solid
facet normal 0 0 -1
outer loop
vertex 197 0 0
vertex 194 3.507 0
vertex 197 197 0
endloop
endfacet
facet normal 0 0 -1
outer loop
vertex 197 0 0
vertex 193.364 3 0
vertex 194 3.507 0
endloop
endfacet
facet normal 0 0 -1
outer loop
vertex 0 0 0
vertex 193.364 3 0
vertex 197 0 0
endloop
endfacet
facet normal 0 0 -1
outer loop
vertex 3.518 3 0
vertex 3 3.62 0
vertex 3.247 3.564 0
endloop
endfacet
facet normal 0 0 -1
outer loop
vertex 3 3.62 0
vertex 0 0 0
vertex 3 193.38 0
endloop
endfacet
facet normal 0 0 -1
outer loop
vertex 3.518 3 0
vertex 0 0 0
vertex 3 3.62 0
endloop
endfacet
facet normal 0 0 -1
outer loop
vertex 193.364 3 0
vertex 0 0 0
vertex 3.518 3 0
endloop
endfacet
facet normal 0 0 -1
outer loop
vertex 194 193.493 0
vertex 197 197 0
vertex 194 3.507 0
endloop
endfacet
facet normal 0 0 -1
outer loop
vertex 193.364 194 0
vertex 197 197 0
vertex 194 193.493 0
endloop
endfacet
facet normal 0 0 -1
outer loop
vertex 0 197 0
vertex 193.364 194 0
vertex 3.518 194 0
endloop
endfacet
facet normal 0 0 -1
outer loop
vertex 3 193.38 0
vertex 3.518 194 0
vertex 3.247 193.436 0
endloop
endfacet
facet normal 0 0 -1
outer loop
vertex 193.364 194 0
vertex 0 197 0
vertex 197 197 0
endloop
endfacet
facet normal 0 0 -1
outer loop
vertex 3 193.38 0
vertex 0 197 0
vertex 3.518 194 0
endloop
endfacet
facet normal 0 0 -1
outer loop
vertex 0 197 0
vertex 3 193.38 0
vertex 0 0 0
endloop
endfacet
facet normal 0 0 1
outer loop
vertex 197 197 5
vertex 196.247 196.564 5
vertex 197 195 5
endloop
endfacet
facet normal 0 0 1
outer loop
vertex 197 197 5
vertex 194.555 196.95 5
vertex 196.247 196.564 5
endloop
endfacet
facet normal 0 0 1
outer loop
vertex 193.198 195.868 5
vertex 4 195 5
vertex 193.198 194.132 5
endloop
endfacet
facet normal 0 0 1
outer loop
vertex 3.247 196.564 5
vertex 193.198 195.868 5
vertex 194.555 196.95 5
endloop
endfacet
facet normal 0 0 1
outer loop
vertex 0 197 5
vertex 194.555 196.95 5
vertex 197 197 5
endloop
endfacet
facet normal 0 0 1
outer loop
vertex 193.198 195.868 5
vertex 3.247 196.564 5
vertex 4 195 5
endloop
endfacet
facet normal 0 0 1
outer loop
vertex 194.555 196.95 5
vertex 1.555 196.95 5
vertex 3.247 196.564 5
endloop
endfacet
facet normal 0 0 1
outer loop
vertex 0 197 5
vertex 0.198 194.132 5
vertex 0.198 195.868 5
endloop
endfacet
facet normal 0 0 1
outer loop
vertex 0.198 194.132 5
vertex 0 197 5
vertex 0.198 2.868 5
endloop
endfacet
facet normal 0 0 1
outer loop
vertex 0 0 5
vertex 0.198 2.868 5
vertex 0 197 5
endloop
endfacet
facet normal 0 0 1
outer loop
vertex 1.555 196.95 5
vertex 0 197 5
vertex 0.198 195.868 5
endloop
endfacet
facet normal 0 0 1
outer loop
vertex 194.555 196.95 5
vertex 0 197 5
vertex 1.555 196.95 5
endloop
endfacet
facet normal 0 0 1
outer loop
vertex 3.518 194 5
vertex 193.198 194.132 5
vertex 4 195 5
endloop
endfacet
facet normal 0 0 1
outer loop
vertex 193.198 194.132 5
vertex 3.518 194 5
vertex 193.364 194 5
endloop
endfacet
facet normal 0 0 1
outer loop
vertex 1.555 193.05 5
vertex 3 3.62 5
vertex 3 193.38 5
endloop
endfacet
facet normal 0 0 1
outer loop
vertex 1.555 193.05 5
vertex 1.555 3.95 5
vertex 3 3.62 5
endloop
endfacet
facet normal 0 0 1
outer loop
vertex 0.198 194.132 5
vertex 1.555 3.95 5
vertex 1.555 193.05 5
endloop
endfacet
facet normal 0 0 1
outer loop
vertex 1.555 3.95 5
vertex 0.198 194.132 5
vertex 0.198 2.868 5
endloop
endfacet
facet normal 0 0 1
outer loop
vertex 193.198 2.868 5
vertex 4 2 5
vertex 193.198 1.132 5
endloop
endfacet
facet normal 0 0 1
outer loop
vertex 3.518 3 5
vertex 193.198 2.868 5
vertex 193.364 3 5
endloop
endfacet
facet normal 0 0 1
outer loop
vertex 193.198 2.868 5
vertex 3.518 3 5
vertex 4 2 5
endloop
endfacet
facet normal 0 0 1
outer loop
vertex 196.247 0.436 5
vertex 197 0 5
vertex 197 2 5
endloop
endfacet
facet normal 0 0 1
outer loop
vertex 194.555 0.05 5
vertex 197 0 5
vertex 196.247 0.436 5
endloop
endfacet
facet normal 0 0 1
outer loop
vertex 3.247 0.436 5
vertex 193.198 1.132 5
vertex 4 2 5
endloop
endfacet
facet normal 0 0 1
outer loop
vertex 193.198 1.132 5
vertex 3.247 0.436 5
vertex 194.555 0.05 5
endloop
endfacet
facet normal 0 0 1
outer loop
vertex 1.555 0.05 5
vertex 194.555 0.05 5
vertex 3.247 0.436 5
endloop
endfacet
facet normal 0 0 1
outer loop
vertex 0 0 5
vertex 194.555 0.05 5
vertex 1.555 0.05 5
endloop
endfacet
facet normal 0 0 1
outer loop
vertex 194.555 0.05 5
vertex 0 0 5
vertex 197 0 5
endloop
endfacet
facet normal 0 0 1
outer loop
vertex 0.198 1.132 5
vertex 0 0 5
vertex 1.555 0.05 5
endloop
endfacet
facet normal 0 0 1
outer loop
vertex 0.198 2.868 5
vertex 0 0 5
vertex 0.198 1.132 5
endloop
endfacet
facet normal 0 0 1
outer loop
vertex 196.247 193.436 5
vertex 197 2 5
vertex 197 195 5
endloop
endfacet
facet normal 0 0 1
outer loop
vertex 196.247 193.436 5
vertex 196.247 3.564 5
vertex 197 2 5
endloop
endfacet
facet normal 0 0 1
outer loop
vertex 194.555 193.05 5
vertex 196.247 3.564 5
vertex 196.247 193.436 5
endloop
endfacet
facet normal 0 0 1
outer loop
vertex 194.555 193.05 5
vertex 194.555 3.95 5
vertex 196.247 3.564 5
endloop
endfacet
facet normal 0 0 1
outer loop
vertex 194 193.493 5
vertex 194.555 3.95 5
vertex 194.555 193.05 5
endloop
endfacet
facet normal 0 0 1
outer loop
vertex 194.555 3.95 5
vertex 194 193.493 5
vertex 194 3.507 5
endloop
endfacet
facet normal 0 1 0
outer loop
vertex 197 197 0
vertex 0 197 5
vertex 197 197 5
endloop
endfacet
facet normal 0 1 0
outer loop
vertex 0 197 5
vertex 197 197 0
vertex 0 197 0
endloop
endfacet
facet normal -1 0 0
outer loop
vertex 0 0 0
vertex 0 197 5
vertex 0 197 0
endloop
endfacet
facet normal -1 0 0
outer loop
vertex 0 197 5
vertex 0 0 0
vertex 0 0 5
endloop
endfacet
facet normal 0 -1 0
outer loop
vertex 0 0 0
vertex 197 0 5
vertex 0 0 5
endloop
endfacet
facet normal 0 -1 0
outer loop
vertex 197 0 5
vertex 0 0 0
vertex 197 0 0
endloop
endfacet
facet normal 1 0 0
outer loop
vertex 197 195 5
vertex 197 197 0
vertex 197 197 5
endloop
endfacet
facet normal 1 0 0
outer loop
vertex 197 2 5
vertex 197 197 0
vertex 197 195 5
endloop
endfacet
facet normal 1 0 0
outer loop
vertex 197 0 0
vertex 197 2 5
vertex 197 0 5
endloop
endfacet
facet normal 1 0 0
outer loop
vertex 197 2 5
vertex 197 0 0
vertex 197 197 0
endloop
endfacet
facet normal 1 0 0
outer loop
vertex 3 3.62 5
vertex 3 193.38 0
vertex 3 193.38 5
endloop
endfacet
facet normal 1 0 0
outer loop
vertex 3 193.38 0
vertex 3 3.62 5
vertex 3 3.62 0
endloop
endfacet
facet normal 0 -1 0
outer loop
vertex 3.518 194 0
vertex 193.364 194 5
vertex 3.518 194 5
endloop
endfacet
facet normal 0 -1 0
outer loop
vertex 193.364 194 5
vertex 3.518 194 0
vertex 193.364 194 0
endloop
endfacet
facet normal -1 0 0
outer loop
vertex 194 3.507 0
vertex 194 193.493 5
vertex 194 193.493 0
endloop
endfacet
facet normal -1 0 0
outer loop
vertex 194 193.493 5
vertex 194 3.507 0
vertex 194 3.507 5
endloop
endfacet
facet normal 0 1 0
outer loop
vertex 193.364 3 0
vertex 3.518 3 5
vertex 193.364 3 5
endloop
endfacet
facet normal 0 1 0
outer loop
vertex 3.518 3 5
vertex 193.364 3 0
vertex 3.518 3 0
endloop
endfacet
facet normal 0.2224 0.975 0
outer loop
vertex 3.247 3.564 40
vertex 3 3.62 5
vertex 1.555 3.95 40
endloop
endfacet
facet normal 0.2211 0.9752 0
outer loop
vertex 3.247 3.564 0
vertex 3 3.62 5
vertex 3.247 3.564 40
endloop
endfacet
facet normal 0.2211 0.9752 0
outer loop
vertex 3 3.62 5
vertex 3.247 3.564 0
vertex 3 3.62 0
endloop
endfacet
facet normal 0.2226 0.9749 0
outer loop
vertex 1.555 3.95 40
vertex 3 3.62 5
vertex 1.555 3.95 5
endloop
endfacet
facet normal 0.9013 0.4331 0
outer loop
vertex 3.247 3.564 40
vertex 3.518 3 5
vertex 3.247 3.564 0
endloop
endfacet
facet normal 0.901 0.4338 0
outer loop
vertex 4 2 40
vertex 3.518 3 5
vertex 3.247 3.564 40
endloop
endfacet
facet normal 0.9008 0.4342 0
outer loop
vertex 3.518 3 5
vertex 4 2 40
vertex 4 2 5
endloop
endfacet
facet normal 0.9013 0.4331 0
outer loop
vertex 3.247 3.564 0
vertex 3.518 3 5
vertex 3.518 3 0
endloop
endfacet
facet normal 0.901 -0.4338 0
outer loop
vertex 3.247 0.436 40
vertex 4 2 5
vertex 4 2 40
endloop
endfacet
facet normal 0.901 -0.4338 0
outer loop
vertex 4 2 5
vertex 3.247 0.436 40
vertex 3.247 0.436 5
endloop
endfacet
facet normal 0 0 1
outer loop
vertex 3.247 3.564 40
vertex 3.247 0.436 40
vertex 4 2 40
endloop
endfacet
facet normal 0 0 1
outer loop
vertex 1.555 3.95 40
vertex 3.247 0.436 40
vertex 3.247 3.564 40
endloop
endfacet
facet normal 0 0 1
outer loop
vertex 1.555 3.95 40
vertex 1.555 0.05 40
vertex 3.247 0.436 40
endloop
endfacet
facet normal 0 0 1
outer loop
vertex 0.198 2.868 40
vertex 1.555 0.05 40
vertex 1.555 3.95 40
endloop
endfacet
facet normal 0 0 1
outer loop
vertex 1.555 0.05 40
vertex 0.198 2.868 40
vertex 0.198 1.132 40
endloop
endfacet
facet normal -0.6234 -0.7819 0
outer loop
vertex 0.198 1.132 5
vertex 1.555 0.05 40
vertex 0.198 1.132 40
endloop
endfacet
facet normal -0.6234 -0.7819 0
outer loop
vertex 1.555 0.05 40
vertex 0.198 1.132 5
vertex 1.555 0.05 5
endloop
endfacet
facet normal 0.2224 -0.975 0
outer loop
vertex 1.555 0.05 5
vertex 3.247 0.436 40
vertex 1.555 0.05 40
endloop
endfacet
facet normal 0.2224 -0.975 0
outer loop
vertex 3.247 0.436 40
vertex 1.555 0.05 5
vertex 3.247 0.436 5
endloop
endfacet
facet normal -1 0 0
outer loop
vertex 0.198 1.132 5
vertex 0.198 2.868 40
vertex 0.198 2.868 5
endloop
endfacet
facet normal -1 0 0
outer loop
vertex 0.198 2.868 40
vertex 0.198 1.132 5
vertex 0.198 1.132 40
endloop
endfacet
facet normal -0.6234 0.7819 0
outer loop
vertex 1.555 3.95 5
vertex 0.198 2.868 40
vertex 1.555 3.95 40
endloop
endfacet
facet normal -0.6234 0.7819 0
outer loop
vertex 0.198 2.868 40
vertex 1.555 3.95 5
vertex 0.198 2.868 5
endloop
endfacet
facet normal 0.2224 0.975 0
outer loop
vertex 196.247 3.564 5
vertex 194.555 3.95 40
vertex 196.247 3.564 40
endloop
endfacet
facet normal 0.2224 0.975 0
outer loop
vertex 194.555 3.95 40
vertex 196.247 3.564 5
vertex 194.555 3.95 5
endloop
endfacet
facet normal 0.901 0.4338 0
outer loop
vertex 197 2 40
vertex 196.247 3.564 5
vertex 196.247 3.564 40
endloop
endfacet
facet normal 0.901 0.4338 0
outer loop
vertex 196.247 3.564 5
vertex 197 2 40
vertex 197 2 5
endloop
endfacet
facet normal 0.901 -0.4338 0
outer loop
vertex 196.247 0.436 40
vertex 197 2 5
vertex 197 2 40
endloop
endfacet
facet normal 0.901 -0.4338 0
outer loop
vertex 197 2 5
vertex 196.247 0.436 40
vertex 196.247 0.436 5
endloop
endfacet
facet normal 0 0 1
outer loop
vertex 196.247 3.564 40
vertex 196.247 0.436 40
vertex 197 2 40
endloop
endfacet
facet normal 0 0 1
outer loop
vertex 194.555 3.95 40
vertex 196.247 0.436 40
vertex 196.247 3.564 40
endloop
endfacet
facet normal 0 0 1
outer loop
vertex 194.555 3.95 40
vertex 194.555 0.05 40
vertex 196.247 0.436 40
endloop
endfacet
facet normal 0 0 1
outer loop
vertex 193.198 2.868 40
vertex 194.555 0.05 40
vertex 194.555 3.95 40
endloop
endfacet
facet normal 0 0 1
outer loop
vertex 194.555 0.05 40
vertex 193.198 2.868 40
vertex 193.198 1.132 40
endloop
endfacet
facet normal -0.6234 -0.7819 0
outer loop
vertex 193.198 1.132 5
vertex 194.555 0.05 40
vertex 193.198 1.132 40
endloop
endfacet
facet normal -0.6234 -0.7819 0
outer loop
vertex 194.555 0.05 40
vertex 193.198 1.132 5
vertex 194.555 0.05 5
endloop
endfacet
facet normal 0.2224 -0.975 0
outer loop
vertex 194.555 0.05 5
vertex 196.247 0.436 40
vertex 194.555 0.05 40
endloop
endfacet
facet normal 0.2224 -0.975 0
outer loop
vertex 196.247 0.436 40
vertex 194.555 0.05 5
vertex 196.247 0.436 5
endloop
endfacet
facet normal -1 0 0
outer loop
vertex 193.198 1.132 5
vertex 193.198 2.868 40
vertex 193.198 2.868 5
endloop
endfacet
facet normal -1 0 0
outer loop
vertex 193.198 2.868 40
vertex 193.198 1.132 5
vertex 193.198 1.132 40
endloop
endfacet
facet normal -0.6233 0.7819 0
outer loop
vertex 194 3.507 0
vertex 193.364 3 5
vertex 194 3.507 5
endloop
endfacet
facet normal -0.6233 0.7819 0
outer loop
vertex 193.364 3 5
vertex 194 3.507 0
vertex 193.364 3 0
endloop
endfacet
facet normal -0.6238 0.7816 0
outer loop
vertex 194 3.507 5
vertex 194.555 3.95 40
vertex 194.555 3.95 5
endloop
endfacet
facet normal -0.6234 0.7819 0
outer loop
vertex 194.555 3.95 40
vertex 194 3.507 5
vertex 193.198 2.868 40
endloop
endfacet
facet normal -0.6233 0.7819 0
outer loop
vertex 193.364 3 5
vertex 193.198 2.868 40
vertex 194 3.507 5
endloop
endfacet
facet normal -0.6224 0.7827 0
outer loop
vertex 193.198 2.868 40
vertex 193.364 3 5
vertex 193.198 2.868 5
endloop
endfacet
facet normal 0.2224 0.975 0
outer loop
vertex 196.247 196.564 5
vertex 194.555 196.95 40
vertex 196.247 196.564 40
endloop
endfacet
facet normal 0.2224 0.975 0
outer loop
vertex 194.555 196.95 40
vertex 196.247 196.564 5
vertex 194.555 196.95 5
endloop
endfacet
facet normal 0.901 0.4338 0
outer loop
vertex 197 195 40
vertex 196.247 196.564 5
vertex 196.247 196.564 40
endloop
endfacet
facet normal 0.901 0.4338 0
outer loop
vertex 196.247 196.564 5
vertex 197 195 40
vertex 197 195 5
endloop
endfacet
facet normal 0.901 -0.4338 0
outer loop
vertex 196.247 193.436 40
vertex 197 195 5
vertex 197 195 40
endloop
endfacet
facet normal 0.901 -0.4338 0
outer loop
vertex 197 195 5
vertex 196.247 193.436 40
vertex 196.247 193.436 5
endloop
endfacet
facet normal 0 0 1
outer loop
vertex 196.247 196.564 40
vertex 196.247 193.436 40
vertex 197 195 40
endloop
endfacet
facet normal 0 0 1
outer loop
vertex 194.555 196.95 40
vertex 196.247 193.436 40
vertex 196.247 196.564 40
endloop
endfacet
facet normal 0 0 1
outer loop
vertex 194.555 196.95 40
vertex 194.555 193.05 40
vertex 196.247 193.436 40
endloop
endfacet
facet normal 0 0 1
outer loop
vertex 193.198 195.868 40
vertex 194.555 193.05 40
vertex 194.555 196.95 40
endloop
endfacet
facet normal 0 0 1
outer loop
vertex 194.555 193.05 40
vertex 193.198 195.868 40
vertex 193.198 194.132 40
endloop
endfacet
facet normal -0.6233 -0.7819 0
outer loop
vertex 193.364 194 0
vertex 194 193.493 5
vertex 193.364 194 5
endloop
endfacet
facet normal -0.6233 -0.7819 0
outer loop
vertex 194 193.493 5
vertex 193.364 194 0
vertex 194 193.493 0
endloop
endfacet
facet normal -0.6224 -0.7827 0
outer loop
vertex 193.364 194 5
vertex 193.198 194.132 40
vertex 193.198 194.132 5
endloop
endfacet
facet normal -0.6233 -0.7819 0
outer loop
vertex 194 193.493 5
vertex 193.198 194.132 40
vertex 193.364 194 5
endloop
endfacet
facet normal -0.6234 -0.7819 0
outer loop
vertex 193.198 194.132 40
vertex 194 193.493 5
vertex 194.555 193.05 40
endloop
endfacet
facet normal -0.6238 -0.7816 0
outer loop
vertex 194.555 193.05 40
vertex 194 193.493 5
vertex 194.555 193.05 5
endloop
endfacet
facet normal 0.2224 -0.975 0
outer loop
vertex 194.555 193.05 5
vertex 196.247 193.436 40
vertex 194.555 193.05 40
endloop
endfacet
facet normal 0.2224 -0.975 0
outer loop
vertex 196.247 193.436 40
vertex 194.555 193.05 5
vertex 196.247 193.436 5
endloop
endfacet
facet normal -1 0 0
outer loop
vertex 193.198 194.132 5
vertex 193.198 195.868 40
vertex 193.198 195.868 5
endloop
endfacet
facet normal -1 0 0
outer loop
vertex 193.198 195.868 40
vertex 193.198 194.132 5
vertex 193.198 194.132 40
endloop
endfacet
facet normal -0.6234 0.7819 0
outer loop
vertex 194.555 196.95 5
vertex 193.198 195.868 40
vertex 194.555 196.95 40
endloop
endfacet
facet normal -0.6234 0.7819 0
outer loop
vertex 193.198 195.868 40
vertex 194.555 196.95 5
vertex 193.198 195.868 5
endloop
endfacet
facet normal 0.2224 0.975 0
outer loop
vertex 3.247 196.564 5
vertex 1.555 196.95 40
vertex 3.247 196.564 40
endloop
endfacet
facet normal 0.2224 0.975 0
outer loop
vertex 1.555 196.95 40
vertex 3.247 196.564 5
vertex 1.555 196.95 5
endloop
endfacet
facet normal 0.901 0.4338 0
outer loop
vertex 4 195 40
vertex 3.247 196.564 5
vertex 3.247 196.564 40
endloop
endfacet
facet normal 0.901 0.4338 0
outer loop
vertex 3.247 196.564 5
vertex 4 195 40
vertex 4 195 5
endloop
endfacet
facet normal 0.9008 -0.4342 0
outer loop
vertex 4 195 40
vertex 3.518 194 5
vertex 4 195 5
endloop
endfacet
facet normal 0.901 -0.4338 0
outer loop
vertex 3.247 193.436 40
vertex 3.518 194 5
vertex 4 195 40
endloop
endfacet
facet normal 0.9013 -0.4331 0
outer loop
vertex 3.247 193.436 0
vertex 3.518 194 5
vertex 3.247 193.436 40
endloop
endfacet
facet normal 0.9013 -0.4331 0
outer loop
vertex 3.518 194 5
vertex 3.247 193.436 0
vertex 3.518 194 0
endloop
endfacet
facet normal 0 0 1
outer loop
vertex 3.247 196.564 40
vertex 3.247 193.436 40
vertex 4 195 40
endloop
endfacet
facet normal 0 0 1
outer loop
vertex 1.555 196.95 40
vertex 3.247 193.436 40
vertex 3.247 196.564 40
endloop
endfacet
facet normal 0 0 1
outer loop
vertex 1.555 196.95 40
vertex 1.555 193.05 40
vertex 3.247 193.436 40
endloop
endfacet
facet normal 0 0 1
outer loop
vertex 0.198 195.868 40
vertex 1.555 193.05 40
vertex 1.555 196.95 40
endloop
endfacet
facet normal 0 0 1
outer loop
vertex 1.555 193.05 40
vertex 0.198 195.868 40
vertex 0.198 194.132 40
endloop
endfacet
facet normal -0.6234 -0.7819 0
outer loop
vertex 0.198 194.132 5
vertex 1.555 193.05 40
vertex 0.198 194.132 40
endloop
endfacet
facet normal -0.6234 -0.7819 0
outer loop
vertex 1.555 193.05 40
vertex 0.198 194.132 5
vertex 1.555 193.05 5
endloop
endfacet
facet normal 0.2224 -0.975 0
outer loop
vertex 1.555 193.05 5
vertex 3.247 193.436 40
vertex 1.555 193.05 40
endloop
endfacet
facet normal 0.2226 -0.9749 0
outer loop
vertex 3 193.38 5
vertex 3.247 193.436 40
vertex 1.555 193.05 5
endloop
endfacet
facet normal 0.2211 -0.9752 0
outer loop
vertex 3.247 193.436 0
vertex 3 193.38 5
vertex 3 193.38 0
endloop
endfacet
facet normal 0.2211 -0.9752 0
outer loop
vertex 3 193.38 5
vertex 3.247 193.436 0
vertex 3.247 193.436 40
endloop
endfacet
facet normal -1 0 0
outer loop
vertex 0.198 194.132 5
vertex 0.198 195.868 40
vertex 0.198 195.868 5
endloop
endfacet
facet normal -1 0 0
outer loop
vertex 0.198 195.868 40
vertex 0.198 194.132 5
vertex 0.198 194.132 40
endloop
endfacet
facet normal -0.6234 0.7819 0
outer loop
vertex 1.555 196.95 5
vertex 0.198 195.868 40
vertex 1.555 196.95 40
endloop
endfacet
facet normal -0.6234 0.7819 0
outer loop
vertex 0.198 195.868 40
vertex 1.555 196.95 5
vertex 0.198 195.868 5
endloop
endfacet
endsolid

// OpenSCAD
outer = 197;
width = 4;

module post() {
    cylinder(d=width,h=40);
}

linear_extrude(height=5)
difference() {
    square(outer);
    translate([width-1,width-1])
    square(outer-width*2+2);
}

translate([width/2,width/2]) post();
translate([outer-width/2,width/2]) post();
translate([outer-width/2,outer-width/2]) post();
translate([width/2,outer-width/2]) post();
